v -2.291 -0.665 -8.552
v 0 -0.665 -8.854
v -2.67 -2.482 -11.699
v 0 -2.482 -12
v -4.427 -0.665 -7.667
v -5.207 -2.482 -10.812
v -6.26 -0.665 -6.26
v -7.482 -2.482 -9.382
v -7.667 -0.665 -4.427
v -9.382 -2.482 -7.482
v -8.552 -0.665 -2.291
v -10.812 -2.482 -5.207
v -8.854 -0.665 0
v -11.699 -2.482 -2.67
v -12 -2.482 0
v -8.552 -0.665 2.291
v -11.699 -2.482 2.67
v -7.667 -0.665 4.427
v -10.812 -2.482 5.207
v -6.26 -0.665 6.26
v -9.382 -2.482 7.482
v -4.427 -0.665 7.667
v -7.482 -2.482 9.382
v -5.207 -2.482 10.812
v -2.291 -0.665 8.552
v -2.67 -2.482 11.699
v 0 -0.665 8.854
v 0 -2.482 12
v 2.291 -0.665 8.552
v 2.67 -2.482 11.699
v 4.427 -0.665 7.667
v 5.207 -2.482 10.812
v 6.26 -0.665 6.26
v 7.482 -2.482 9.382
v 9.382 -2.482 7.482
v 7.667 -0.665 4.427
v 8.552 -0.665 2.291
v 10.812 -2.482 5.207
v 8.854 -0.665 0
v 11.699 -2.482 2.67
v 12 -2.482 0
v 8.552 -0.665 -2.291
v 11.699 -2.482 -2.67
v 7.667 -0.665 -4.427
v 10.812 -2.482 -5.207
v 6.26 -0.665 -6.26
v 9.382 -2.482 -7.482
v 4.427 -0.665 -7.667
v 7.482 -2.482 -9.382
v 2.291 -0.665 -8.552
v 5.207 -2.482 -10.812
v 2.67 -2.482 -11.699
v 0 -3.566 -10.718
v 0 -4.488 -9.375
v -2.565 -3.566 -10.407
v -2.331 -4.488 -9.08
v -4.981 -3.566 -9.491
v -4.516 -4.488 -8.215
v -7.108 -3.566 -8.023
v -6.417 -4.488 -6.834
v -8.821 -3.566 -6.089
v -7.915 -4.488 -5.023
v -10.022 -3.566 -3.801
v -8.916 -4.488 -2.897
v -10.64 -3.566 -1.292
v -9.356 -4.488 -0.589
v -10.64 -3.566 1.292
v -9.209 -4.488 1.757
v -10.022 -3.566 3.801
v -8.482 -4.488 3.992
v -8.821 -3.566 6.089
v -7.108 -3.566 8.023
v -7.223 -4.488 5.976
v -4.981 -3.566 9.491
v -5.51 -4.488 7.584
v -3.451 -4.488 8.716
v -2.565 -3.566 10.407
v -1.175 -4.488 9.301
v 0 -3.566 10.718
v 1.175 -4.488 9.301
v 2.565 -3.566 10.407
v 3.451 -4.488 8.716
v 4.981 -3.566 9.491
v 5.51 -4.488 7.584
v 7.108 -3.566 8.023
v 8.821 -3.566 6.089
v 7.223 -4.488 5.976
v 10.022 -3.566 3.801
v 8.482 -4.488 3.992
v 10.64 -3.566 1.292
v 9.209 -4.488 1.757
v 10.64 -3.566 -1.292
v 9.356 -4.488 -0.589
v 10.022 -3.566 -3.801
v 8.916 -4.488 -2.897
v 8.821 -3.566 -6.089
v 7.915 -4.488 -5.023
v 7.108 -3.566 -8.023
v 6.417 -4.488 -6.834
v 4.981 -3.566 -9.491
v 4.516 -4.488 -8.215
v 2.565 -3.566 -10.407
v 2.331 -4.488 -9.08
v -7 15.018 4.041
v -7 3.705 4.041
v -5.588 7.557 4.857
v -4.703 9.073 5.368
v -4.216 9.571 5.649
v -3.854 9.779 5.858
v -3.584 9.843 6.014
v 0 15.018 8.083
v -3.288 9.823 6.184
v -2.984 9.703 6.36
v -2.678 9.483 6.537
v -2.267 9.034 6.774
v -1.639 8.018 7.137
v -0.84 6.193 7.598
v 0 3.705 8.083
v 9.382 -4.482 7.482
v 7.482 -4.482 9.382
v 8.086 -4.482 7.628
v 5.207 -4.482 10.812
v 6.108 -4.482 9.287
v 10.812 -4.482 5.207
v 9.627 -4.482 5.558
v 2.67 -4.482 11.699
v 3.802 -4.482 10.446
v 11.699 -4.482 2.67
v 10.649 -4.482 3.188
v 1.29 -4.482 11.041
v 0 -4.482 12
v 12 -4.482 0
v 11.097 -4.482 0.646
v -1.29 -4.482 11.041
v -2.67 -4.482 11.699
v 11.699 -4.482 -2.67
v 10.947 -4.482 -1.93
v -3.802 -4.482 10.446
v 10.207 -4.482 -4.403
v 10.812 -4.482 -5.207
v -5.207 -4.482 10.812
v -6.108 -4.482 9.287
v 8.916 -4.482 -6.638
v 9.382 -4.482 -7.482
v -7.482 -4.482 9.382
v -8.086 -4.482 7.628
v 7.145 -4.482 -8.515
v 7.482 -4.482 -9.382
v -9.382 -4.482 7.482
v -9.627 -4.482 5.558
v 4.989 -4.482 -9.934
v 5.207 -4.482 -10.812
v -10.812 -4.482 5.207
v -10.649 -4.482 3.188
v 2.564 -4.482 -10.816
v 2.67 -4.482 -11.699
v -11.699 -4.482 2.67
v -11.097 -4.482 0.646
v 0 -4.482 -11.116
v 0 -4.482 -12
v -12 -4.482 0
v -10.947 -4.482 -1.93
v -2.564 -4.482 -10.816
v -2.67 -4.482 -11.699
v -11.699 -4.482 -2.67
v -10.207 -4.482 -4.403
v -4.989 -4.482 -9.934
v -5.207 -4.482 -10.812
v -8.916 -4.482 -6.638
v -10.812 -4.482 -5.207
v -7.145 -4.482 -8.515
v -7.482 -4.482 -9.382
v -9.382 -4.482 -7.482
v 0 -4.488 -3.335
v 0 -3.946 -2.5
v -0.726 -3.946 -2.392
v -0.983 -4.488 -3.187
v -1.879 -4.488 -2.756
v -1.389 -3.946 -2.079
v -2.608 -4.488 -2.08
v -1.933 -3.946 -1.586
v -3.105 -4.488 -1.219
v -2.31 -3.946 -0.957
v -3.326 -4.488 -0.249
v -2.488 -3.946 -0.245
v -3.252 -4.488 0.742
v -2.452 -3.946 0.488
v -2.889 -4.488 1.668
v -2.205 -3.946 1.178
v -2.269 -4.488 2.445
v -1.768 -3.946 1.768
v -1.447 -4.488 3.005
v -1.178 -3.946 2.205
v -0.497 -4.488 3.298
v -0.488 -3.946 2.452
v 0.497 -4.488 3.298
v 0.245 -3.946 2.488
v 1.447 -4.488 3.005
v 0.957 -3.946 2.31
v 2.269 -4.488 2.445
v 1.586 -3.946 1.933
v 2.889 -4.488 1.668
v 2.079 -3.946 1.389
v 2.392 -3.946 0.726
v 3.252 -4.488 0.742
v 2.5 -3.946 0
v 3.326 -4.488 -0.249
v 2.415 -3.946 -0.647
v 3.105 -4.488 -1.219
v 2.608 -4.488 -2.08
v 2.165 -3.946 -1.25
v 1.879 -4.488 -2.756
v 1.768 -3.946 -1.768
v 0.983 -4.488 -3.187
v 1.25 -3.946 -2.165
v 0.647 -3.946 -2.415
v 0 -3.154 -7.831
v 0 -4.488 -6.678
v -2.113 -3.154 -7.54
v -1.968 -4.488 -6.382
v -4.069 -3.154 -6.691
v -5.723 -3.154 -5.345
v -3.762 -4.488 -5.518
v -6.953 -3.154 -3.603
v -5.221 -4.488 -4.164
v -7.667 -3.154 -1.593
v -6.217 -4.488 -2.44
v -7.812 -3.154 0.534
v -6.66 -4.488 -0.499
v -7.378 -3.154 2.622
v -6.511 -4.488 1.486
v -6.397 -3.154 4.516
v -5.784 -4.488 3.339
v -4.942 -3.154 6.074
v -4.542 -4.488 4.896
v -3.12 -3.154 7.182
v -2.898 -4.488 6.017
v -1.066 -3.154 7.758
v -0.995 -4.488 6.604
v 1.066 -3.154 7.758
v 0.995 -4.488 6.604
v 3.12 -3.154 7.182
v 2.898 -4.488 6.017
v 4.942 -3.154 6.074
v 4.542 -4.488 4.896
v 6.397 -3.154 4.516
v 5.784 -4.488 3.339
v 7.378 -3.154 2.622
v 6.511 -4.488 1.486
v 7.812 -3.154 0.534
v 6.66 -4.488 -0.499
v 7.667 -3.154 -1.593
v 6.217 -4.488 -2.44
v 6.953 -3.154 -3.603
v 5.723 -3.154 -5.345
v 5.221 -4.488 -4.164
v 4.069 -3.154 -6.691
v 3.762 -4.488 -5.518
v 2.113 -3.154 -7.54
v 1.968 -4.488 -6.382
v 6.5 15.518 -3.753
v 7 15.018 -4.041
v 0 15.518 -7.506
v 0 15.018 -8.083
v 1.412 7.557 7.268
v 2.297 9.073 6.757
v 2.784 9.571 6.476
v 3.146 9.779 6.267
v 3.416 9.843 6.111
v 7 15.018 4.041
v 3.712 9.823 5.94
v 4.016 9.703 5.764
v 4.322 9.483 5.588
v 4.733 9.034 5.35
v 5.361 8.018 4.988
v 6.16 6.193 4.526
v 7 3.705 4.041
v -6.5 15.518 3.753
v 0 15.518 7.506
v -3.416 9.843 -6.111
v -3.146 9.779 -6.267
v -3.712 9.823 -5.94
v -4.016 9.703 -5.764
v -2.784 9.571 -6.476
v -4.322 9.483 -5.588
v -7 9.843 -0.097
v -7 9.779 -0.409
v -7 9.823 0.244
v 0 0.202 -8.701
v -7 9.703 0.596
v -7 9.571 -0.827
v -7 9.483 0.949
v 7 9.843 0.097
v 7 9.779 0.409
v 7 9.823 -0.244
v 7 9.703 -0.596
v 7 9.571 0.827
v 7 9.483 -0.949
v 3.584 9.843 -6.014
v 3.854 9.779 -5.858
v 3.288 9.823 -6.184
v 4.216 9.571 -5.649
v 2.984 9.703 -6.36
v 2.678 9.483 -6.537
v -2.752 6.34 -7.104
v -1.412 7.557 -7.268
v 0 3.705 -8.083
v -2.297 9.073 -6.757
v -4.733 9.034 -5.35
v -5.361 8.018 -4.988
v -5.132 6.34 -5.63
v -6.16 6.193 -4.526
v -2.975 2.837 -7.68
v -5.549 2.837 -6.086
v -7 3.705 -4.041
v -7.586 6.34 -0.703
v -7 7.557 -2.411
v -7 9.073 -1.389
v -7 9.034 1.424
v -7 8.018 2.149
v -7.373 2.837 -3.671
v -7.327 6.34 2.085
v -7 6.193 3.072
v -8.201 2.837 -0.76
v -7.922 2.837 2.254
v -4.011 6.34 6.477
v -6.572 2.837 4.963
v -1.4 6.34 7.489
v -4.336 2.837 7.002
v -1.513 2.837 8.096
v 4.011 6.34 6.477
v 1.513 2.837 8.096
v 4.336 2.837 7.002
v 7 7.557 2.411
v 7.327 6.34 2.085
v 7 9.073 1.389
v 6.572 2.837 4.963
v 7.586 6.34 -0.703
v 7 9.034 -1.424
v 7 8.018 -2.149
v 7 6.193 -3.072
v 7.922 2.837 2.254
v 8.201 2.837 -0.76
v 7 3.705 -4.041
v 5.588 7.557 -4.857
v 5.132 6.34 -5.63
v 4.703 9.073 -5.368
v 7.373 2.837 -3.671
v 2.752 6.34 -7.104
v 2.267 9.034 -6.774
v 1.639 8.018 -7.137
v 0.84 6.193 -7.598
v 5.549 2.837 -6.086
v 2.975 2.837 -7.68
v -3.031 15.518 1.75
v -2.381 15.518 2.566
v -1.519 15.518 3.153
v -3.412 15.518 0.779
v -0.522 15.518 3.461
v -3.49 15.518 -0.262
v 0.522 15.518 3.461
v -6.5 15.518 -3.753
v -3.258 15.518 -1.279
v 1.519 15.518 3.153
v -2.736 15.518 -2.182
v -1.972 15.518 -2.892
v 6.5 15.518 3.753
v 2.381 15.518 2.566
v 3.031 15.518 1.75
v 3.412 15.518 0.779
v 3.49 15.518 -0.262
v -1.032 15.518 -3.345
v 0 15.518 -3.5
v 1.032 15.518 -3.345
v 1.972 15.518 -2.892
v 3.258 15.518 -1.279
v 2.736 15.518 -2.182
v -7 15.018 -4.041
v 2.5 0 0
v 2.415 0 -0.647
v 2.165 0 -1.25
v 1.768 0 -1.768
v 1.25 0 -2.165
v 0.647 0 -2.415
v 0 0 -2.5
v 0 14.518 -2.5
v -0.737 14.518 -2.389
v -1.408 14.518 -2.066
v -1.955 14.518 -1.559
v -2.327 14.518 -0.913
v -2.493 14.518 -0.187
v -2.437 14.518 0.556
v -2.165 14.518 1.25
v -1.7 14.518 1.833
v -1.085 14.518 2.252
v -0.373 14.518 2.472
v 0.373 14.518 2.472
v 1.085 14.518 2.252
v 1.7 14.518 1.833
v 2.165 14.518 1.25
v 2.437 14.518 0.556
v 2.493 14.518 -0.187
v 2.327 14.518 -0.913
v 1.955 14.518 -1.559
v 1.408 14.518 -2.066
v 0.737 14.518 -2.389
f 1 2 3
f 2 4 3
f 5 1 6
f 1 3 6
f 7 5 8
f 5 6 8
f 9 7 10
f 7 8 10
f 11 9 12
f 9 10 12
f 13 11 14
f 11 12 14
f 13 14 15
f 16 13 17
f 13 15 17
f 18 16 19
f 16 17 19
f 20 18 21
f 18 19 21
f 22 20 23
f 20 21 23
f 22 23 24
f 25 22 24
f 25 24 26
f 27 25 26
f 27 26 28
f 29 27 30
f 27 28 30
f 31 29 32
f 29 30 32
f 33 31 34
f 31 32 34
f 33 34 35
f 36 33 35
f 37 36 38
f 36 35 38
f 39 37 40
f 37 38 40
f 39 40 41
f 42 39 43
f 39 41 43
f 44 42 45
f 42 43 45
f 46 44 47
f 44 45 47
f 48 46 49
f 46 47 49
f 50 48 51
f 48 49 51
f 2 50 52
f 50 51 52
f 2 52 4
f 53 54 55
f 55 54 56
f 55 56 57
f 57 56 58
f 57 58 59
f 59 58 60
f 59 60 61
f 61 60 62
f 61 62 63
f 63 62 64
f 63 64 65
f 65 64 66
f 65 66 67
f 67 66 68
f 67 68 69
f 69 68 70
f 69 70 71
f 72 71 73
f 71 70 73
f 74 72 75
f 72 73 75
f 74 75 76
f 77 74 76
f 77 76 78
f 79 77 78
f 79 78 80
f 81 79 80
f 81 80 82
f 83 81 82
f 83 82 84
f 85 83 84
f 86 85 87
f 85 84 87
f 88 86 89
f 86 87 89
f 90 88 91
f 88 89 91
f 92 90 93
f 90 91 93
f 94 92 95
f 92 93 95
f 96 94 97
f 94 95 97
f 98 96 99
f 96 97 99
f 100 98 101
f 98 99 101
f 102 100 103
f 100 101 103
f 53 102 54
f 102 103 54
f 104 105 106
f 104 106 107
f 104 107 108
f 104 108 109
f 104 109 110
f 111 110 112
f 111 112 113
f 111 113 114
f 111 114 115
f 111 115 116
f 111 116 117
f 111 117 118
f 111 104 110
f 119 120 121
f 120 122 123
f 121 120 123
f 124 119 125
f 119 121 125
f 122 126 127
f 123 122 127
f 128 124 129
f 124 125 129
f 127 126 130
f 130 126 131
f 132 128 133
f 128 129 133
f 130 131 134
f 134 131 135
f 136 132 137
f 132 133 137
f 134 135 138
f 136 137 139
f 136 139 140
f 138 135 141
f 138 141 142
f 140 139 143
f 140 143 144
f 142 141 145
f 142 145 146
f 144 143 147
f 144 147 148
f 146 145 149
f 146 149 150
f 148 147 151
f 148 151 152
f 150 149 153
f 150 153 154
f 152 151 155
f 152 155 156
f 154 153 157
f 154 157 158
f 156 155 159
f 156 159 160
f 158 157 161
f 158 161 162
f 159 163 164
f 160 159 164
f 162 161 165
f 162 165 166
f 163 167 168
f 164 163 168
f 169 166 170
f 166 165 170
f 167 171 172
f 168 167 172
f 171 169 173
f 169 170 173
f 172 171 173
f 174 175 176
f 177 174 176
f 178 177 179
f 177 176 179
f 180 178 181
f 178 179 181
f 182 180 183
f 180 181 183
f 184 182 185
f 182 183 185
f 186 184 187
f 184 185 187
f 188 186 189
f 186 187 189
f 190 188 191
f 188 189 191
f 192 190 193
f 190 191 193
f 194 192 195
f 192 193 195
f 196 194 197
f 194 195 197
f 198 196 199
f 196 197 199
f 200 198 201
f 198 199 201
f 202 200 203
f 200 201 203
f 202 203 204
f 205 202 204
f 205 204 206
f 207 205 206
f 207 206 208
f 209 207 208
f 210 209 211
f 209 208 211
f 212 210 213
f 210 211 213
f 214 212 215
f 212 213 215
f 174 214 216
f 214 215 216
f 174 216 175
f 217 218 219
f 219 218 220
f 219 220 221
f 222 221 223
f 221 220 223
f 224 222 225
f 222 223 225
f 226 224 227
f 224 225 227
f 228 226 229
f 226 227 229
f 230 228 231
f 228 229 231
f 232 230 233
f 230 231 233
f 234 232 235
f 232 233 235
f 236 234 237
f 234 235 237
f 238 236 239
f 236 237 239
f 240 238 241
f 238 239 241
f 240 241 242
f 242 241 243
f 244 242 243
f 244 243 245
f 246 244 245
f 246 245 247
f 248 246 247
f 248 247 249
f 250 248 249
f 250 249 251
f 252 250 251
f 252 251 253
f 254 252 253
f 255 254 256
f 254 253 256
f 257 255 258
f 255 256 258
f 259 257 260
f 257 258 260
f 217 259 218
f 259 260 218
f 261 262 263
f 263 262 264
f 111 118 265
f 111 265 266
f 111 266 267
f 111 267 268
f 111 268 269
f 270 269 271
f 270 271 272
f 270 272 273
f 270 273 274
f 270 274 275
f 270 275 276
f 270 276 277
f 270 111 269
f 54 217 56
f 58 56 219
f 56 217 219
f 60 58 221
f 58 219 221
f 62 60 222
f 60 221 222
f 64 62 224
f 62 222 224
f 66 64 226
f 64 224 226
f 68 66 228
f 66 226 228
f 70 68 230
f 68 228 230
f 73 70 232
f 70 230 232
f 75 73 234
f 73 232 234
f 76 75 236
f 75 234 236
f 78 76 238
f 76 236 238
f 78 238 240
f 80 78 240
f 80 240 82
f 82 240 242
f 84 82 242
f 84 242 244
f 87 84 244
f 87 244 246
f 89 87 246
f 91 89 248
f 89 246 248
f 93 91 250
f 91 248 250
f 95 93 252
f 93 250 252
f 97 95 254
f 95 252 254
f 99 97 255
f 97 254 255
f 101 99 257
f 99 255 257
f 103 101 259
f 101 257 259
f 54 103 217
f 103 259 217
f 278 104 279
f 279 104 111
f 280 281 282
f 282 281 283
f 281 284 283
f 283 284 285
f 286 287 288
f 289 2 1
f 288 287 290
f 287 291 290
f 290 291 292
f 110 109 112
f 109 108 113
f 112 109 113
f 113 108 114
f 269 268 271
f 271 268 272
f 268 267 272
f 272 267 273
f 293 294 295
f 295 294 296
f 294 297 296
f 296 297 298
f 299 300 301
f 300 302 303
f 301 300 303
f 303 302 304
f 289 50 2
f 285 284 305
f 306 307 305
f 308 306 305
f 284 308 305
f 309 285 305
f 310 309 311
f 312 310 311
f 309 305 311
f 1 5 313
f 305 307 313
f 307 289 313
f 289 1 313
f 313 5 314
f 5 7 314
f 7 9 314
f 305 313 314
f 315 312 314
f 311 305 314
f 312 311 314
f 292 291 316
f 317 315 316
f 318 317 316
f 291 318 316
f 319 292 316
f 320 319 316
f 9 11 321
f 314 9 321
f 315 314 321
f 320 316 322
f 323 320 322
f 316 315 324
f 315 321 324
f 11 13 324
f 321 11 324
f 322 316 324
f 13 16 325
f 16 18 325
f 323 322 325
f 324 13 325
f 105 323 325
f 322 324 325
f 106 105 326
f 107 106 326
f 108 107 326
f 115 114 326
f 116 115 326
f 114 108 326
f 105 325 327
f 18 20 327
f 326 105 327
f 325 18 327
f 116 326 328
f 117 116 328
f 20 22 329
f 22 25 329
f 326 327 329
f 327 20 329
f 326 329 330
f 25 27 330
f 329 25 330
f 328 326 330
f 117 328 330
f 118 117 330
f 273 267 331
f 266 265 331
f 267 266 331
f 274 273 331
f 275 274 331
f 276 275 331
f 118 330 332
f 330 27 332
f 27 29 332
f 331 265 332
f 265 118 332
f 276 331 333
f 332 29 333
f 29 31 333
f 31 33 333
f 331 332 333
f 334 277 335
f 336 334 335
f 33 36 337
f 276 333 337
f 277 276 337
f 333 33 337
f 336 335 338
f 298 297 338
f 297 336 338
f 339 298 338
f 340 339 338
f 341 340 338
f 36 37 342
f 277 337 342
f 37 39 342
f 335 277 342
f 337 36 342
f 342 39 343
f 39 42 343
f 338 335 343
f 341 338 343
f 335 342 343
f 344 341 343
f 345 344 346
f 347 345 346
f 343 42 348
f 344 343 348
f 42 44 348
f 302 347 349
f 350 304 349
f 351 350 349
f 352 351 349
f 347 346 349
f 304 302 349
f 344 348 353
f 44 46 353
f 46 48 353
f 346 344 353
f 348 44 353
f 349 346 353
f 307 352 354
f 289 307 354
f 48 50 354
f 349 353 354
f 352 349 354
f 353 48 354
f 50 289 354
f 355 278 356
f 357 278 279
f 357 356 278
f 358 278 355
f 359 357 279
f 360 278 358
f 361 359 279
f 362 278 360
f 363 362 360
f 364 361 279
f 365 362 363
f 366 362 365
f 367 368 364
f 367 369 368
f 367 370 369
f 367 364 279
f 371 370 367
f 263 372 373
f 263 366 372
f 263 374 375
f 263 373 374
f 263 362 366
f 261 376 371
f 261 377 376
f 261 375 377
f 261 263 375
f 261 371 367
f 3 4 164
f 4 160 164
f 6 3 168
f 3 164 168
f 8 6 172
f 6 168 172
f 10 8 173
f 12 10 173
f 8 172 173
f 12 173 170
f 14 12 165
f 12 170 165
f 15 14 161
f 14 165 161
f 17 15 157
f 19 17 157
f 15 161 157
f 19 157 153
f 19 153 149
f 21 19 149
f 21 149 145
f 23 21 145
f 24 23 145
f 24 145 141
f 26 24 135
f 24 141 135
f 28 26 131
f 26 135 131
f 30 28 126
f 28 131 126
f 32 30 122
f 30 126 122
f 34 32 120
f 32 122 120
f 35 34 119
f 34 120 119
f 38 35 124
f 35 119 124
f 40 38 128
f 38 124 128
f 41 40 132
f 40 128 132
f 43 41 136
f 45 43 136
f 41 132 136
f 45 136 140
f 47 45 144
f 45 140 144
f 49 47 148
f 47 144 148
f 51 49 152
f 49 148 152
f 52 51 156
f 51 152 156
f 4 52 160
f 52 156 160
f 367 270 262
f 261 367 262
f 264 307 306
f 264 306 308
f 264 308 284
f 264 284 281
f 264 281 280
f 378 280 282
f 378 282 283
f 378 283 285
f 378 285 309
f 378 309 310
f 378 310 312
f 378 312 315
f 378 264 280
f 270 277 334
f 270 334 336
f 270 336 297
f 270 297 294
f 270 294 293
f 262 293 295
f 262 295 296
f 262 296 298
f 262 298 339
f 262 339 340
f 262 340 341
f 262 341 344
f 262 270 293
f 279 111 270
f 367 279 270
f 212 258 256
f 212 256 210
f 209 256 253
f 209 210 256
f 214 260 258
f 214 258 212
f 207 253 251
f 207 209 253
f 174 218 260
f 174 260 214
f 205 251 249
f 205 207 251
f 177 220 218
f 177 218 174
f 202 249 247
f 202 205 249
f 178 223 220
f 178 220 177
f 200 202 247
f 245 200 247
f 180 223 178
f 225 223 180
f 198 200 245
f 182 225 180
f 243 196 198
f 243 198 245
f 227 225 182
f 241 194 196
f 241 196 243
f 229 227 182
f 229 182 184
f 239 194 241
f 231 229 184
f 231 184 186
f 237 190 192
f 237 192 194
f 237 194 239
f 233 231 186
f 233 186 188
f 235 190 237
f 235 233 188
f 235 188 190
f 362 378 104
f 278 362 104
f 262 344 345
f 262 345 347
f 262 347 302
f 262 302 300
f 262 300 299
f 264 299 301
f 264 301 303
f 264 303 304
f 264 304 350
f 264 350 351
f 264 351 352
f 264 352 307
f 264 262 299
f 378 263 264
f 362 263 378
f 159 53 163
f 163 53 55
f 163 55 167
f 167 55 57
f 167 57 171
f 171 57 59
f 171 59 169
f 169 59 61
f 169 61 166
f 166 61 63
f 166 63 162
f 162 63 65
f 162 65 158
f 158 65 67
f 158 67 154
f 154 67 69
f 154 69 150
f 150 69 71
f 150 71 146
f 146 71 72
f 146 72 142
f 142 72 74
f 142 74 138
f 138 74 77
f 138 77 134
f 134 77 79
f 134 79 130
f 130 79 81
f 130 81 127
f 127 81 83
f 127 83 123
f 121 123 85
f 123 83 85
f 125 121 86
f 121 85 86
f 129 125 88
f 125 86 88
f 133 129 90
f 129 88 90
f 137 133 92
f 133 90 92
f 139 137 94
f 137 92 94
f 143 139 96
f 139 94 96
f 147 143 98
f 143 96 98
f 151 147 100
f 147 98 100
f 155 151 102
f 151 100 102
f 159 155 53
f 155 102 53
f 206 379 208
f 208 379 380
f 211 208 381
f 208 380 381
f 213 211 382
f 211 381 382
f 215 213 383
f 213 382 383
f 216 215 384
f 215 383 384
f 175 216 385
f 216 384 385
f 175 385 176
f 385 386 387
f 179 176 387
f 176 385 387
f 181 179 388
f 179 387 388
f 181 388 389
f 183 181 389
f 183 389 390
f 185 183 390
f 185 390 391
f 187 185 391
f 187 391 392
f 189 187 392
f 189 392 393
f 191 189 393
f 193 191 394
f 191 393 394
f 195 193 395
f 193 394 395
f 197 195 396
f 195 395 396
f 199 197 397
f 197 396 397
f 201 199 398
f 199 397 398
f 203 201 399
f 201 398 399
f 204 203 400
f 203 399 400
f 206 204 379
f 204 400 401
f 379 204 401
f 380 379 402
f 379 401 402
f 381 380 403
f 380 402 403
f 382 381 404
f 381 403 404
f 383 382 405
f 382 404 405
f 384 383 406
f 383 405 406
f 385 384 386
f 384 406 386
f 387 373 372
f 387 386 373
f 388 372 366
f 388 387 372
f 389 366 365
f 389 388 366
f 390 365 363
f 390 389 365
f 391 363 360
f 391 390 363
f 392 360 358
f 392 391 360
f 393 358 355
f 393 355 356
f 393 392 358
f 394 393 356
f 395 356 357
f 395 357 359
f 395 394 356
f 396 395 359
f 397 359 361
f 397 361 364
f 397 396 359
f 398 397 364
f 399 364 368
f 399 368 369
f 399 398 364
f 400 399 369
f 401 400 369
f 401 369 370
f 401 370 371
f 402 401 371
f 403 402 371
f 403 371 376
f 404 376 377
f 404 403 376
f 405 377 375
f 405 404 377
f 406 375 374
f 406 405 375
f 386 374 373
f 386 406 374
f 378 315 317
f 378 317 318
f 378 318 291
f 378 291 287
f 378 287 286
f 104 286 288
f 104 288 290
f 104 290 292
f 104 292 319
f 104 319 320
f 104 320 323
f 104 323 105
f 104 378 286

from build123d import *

# Parameters (mm, degrees)
CHAMFER1_SIZE         = 1
SKETCH2_R             = 6
BOSS_EXTRUDE1_DEPTH   = 15
CHAMFER2_SIZE         = 0.5
F_5_0MM_DOWEL_HOLE1_D = 5


with BuildPart() as part:
    # Sketch1 → Revolve1 (revolve)
    with BuildSketch(Plane.XY, mode=Mode.PRIVATE) as revolve1_sk:
        Polygon((2.5, 15.517957554), (6, 15.517957554), (8.853571596, -0.66545116), (12, -2.482042446), (12, -4.482042446), (11.116055663, -4.482042446), (10.718293105, -3.566194226), (9.374682102, -4.487525743), (7.83057192, -3.153662628), (6.678328492, -4.487525743), (4.849032939, -4.487525743), (3.335400026, -4.487525743), (2.39653501, -3.879149231), (1.705781249, -4.482042446), (0, -4.482042446), (0, 0), (2.5, 0), align=None)
    revolve(revolve1_sk.sketch.rotate(Axis((0, -4.482042446, 0), (0, 1, 0)), 90), axis=Axis((0, -4.482042446, 0), (0, 1, 0)))

    # Chamfer1
    chamfer1_edges = [part.edges().sort_by_distance(p)[0] for p in [
        (0, 15.517957554, 2.5),
    ]]
    chamfer(chamfer1_edges, length=CHAMFER1_SIZE)

    # Sketch2 → Boss-Extrude1 (add)
    with BuildSketch(Plane(origin=(0, 15.517957554, 0), x_dir=(1, 0, 0), z_dir=(0, 1, 0))):
        Polygon((0, 8.082903769), (-7, 4.041451884), (-7, -4.041451884), (0, -8.082903769), (7, -4.041451884), (7, 4.041451884), align=None)
        Circle(SKETCH2_R, mode=Mode.SUBTRACT)
    extrude(amount=-BOSS_EXTRUDE1_DEPTH)

    # Chamfer2
    chamfer2_edges = [part.edges().sort_by_distance(p)[0] for p in [
        (3.5, 15.517957554, -6.062177826),
        (-3.5, 15.517957554, -6.062177826),
        (-7, 15.517957554, 0),
        (-3.5, 15.517957554, 6.062177826),
        (3.5, 15.517957554, 6.062177826),
        (7, 15.517957554, 0),
    ]]
    chamfer(chamfer2_edges, length=CHAMFER2_SIZE)

    # Ø5.0mm Dowel Hole1 (through all)
    with Locations(Plane(origin=(0, -4.482042446, 0), x_dir=(-1, 0, 0), z_dir=(0, -1, 0))):
        with Locations((0, 0)):
            Hole(F_5_0MM_DOWEL_HOLE1_D / 2)


solid = part.part
